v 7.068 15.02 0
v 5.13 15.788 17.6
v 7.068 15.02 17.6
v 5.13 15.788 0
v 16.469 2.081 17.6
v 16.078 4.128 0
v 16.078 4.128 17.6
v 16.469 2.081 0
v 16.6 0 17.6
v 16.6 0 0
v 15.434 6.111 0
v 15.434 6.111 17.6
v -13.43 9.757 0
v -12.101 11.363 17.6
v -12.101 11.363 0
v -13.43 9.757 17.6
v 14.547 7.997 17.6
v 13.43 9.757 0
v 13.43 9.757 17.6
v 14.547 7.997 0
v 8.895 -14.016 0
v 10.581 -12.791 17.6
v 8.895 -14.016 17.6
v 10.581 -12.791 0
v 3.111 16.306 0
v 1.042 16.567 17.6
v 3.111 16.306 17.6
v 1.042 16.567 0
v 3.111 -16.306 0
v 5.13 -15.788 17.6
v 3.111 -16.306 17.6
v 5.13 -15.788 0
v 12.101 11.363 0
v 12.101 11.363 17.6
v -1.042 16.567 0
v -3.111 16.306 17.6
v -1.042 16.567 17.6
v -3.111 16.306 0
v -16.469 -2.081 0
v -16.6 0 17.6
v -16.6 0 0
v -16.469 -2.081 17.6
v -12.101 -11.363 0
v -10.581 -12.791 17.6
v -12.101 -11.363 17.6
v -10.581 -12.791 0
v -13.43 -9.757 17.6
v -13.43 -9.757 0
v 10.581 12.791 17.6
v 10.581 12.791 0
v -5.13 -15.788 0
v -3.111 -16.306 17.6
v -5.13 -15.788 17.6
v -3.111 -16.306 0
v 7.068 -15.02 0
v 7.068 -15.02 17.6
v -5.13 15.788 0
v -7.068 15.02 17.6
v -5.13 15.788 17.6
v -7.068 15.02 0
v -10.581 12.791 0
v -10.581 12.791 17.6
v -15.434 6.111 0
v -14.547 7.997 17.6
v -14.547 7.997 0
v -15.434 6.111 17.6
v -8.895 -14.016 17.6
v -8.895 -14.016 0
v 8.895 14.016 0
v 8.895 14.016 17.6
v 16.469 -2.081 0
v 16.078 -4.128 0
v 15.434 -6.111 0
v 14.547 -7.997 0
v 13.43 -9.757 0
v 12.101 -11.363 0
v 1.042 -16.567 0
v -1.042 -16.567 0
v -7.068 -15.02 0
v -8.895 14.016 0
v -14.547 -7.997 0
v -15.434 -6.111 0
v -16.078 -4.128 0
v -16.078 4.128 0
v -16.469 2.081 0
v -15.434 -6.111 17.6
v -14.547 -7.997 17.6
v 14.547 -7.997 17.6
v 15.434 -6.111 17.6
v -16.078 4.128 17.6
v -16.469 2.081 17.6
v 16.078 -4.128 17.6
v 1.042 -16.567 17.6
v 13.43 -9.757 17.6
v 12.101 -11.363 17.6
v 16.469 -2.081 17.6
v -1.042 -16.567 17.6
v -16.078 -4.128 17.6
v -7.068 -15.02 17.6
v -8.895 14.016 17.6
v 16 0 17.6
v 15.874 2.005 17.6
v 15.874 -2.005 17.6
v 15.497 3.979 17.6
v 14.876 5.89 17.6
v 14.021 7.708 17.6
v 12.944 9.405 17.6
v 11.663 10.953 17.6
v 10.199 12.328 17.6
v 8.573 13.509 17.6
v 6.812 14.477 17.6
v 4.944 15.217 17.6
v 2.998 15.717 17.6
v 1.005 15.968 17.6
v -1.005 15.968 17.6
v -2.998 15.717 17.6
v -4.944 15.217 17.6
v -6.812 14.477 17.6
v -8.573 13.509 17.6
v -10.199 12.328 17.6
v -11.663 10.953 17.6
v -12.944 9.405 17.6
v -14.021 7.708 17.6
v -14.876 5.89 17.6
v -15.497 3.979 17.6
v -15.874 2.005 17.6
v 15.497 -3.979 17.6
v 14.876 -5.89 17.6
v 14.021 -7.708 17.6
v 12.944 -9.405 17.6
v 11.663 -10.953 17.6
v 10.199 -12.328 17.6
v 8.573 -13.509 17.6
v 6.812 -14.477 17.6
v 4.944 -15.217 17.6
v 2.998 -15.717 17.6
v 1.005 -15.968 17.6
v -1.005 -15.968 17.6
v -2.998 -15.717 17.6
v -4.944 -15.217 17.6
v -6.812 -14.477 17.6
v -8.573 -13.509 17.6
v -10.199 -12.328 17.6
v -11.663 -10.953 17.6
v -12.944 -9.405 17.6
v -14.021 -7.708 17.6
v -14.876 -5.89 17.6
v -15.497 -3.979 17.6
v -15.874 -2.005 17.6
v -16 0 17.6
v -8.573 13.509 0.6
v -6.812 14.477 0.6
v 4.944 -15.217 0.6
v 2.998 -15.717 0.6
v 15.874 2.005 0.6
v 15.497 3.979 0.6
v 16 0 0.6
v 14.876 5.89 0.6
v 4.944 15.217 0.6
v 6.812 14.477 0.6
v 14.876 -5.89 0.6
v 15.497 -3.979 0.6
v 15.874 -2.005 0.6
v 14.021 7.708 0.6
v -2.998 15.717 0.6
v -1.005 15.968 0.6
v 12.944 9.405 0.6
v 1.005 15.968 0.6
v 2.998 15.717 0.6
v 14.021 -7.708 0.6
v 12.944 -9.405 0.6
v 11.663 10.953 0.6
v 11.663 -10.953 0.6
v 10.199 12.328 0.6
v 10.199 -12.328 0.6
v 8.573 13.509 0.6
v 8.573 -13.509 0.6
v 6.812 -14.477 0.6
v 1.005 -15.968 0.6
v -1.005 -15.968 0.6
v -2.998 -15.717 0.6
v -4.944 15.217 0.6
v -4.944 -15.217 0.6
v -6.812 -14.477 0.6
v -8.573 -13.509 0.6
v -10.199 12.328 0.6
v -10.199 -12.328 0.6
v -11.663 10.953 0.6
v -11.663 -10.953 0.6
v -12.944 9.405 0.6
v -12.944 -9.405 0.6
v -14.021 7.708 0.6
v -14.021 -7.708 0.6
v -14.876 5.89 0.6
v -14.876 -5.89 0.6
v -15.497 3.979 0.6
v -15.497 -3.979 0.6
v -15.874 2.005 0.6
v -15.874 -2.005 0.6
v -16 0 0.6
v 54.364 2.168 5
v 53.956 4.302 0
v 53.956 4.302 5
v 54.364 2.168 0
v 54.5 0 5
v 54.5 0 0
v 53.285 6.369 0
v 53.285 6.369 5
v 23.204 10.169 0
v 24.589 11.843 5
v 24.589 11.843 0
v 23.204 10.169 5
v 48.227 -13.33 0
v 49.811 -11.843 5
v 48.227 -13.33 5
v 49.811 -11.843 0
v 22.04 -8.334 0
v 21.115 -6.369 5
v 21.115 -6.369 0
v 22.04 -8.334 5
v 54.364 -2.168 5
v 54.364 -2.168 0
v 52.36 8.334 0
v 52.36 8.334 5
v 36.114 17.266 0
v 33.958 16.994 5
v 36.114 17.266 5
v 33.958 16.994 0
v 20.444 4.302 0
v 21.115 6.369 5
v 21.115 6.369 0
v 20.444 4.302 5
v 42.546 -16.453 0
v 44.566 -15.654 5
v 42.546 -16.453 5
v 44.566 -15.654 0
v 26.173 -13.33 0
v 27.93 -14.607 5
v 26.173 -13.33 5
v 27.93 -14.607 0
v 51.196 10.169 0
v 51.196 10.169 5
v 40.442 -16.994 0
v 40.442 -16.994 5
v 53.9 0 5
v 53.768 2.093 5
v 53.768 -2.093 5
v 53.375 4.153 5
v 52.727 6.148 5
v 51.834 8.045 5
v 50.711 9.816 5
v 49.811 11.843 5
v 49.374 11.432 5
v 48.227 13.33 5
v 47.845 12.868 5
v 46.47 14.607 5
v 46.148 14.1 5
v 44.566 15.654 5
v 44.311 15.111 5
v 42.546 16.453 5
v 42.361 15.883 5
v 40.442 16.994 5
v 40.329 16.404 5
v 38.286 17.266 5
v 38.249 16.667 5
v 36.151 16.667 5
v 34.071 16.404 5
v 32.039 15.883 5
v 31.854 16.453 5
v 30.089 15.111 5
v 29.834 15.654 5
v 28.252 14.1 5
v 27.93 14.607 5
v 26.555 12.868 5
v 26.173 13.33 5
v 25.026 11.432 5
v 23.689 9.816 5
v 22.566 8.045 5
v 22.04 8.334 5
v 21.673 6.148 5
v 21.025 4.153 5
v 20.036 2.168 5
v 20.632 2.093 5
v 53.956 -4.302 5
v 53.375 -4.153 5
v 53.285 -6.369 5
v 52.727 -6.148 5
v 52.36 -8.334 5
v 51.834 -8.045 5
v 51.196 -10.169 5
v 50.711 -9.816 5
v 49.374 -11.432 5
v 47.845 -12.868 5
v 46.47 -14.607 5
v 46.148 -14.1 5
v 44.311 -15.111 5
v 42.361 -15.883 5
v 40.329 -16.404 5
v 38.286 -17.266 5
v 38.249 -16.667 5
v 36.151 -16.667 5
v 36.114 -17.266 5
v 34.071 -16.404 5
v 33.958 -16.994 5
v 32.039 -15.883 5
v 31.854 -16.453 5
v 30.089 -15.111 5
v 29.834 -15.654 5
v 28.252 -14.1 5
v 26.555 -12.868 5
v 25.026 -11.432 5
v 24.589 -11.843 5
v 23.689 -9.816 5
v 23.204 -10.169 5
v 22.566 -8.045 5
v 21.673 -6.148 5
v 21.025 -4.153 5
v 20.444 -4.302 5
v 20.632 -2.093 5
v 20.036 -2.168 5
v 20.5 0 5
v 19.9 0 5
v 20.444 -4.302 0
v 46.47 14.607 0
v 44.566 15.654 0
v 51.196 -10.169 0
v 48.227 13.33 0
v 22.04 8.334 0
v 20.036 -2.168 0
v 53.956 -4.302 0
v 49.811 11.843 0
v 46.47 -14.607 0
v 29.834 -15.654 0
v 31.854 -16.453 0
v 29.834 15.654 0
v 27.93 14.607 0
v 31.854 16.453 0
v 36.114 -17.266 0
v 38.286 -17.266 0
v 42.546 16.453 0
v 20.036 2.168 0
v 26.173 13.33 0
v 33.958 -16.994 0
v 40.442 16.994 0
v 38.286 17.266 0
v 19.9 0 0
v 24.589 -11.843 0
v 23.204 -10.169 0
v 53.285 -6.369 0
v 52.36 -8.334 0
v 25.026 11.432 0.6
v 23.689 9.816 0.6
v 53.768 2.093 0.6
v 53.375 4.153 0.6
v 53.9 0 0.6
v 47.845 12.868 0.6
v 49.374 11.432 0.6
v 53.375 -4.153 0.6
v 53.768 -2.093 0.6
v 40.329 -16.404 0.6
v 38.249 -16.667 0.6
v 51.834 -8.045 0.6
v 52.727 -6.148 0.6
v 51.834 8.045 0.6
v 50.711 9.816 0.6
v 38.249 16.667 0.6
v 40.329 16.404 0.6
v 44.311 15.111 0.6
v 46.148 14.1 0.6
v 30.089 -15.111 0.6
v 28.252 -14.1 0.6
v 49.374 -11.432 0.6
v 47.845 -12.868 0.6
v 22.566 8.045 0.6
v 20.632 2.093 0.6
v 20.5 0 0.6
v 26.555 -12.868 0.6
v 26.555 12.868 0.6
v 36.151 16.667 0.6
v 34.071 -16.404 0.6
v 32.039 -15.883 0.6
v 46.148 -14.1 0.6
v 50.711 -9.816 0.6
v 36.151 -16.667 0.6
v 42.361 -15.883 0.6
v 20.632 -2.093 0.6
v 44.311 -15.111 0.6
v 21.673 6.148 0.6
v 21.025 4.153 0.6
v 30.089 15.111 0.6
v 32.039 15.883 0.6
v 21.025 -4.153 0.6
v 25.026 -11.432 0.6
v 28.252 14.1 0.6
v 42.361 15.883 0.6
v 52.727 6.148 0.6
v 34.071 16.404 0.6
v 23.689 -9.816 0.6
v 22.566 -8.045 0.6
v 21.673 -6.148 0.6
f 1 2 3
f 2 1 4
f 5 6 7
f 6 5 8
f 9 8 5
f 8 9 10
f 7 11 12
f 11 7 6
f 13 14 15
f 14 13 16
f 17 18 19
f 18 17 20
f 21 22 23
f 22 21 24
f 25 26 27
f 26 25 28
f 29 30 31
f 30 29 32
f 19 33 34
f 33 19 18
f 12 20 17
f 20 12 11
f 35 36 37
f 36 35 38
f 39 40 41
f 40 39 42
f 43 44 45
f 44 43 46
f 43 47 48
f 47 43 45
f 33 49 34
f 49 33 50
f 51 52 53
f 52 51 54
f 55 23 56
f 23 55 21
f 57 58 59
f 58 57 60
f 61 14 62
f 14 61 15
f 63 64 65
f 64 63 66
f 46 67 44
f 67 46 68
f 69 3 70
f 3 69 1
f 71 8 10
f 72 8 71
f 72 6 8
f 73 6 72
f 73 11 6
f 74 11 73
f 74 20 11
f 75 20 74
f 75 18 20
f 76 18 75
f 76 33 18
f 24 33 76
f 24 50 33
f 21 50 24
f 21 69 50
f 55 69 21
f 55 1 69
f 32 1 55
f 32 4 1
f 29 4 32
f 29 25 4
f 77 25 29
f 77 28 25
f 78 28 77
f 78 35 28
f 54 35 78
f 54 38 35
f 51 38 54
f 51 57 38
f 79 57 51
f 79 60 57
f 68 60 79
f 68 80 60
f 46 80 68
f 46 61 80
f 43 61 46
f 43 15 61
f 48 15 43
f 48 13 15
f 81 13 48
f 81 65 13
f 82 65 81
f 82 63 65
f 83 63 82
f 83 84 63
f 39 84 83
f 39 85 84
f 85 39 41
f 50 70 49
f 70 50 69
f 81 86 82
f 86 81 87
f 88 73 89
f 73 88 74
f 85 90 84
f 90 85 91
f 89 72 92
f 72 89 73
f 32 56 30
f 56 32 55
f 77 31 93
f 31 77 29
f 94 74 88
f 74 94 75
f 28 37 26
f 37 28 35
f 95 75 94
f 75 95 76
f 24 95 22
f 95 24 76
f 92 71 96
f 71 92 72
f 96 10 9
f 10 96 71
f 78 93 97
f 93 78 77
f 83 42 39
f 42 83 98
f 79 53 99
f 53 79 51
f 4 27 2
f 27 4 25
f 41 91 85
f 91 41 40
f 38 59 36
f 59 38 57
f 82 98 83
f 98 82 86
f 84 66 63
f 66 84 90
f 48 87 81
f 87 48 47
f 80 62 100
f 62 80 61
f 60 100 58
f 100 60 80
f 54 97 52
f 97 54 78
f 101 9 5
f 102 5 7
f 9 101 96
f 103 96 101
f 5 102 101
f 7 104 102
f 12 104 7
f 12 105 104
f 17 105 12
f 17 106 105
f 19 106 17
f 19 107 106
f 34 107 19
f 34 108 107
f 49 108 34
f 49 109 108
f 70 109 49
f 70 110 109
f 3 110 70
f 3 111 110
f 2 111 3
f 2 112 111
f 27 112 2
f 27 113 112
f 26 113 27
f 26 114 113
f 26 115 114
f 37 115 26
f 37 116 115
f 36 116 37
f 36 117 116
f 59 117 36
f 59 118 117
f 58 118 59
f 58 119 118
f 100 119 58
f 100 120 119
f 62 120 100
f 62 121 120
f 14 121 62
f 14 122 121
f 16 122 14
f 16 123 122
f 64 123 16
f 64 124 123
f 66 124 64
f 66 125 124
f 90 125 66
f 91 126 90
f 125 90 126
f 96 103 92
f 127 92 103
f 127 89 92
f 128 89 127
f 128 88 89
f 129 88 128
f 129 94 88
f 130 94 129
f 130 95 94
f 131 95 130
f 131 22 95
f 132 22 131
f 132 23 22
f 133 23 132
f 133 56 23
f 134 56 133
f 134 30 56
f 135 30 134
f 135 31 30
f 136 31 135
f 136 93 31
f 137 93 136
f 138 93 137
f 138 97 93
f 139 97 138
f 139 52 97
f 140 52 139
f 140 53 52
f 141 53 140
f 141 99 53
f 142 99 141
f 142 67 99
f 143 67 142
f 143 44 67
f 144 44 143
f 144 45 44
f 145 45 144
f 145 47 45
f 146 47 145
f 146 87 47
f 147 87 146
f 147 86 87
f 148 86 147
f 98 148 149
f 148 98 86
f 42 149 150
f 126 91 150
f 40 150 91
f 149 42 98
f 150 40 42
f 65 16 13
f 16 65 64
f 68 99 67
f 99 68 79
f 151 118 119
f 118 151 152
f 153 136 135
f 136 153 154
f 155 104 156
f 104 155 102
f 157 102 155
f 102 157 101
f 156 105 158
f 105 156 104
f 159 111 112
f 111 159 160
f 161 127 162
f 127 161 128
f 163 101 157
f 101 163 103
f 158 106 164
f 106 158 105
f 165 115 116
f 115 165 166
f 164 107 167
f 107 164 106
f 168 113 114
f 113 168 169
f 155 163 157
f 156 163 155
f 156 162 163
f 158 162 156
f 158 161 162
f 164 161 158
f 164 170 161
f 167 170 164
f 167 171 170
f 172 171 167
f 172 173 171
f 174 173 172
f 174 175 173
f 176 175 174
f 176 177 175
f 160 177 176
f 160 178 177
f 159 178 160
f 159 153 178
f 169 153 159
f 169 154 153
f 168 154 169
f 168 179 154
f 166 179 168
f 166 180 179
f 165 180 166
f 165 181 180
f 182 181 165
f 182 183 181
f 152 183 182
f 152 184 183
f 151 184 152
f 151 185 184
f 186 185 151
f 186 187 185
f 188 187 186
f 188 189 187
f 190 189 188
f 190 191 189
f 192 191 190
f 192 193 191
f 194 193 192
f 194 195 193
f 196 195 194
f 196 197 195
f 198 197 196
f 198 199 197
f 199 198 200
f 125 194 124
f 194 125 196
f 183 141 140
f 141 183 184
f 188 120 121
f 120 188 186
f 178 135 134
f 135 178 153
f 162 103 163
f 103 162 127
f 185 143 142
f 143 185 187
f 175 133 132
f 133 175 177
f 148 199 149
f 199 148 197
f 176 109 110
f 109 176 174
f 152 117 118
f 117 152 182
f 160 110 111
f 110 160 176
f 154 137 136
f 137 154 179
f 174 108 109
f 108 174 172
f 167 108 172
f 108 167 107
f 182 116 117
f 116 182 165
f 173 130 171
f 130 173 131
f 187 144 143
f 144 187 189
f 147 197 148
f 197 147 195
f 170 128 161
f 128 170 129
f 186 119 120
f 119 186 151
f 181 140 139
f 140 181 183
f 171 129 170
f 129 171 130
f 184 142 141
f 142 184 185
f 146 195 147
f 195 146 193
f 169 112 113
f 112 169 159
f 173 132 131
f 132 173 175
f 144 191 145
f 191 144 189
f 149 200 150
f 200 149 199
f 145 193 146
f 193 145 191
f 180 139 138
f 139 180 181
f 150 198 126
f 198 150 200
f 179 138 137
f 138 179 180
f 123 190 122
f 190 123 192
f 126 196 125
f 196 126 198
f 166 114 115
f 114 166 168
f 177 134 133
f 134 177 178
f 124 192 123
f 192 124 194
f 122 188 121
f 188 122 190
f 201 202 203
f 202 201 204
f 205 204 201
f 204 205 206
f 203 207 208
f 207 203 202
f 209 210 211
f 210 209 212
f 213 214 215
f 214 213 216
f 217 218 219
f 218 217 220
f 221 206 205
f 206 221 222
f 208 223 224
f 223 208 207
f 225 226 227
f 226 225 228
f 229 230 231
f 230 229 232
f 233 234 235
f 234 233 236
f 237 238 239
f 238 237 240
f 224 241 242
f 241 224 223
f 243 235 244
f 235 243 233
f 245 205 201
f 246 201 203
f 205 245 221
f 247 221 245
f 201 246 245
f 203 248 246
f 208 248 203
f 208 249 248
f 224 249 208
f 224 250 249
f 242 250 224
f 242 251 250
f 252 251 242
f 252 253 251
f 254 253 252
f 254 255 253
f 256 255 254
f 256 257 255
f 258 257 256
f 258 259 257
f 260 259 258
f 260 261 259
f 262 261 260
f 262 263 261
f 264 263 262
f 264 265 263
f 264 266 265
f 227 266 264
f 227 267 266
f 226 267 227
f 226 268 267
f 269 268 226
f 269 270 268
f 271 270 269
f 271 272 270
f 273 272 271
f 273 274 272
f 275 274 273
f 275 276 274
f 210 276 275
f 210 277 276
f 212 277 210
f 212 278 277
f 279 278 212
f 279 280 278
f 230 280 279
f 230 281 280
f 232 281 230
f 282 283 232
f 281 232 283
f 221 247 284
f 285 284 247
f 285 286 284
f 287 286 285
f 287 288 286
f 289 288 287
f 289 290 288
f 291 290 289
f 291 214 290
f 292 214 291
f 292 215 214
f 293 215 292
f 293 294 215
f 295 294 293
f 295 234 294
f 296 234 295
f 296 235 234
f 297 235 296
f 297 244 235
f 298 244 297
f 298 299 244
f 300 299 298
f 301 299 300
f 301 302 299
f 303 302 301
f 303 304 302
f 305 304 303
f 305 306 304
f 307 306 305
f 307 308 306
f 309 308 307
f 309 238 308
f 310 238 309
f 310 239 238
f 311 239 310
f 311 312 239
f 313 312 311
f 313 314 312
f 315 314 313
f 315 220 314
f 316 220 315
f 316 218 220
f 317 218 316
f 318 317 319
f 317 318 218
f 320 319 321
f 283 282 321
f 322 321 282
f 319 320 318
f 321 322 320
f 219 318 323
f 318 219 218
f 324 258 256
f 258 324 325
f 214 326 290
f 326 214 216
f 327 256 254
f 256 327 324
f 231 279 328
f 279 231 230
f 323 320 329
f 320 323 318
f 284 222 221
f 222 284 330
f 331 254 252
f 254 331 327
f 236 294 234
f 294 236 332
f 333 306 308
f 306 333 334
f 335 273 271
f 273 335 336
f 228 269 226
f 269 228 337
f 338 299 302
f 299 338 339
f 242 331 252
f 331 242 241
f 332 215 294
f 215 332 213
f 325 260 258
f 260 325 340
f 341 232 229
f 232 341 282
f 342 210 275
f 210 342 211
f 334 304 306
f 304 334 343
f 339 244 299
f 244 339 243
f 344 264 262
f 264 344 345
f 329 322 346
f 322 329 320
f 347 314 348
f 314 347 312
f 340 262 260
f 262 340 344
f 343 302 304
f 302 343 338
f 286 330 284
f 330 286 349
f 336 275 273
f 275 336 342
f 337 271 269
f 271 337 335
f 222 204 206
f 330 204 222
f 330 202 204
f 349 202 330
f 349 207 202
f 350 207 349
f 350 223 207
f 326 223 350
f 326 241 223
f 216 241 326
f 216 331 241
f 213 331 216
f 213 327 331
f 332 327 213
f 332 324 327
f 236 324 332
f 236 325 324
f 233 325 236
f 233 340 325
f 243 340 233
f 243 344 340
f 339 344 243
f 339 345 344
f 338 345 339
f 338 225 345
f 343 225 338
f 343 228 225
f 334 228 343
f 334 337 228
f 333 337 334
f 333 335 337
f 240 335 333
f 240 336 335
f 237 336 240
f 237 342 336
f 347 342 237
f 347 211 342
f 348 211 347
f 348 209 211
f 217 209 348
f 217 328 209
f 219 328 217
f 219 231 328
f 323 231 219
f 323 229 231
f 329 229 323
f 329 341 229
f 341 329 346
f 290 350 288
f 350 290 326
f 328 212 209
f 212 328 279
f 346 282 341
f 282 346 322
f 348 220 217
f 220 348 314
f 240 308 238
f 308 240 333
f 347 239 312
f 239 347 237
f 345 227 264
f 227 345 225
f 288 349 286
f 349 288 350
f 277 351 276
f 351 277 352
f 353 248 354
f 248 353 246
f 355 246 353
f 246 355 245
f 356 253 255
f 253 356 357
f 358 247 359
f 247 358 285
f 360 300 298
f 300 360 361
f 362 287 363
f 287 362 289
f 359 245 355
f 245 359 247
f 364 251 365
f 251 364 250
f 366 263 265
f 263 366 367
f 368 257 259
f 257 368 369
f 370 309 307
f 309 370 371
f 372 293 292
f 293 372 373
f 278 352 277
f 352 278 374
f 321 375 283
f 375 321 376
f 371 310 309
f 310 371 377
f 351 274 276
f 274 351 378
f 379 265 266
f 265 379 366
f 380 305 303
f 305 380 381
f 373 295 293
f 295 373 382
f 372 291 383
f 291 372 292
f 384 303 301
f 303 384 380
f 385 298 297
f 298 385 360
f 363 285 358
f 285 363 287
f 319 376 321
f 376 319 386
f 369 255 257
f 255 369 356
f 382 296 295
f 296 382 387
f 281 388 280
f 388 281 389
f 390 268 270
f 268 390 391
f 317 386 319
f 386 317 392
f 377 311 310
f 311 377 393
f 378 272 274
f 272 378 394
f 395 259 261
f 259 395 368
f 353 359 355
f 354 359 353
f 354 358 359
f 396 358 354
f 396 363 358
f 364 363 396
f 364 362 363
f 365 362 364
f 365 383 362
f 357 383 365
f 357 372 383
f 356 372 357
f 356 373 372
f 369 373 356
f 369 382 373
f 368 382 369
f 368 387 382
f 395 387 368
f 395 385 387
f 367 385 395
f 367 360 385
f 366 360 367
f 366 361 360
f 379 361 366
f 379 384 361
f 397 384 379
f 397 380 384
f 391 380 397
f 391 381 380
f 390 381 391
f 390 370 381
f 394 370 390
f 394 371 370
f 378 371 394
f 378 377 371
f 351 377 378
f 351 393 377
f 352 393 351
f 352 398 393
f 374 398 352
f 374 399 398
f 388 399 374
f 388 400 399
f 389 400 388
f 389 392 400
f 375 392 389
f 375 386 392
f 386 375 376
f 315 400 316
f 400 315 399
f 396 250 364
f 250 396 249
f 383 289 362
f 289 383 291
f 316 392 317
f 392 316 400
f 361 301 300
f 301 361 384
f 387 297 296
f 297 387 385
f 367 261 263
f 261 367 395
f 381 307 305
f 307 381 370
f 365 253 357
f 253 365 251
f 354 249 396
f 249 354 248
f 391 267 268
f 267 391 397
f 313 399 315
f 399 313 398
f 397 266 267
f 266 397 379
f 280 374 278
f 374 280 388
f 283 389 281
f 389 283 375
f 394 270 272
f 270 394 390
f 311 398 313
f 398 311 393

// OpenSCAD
// preview[view:south west, tilt:top diagonal]

/* [Container] */
// Inner diameter
diameter = 32;
// Bottom and top thickness
bottom = 0.6;
// Wall thickess
wall = 0.6;
// Container Height
height = 17;
// Height of the lid
lidHeight = 5;
// Clearance between container and lid
clearance = 0.1;

/* [View] */
// Which parts would you like to see?
part = "all"; // [all:Container and Lid, container:Container Only, lid:Lid Only]

/* [HIDDEN] */
radius = diameter / 2;
total = height + bottom;

printPart();

module printPart() {
  if(part == "container") container();
  else if(part == "lid") lid();
  else {
    container();
    translate([diameter + clearance * 2 + 5, 0, 0])
      lid();
  }
}

module container() {
    difference() {
        cylinder(r=(radius + wall), h=total, $fn=50);
        
        translate([0, 0, bottom])
            cylinder(r=radius, h=total, $fn=50);
    }
}

module lid() {
    difference() {
        cylinder(r=(radius + wall * 2 + clearance), h=lidHeight, $fn=50);
        
        translate([0, 0, bottom])
            cylinder(r=(radius + wall + clearance), h=lidHeight, $fn=50);
    }
}
